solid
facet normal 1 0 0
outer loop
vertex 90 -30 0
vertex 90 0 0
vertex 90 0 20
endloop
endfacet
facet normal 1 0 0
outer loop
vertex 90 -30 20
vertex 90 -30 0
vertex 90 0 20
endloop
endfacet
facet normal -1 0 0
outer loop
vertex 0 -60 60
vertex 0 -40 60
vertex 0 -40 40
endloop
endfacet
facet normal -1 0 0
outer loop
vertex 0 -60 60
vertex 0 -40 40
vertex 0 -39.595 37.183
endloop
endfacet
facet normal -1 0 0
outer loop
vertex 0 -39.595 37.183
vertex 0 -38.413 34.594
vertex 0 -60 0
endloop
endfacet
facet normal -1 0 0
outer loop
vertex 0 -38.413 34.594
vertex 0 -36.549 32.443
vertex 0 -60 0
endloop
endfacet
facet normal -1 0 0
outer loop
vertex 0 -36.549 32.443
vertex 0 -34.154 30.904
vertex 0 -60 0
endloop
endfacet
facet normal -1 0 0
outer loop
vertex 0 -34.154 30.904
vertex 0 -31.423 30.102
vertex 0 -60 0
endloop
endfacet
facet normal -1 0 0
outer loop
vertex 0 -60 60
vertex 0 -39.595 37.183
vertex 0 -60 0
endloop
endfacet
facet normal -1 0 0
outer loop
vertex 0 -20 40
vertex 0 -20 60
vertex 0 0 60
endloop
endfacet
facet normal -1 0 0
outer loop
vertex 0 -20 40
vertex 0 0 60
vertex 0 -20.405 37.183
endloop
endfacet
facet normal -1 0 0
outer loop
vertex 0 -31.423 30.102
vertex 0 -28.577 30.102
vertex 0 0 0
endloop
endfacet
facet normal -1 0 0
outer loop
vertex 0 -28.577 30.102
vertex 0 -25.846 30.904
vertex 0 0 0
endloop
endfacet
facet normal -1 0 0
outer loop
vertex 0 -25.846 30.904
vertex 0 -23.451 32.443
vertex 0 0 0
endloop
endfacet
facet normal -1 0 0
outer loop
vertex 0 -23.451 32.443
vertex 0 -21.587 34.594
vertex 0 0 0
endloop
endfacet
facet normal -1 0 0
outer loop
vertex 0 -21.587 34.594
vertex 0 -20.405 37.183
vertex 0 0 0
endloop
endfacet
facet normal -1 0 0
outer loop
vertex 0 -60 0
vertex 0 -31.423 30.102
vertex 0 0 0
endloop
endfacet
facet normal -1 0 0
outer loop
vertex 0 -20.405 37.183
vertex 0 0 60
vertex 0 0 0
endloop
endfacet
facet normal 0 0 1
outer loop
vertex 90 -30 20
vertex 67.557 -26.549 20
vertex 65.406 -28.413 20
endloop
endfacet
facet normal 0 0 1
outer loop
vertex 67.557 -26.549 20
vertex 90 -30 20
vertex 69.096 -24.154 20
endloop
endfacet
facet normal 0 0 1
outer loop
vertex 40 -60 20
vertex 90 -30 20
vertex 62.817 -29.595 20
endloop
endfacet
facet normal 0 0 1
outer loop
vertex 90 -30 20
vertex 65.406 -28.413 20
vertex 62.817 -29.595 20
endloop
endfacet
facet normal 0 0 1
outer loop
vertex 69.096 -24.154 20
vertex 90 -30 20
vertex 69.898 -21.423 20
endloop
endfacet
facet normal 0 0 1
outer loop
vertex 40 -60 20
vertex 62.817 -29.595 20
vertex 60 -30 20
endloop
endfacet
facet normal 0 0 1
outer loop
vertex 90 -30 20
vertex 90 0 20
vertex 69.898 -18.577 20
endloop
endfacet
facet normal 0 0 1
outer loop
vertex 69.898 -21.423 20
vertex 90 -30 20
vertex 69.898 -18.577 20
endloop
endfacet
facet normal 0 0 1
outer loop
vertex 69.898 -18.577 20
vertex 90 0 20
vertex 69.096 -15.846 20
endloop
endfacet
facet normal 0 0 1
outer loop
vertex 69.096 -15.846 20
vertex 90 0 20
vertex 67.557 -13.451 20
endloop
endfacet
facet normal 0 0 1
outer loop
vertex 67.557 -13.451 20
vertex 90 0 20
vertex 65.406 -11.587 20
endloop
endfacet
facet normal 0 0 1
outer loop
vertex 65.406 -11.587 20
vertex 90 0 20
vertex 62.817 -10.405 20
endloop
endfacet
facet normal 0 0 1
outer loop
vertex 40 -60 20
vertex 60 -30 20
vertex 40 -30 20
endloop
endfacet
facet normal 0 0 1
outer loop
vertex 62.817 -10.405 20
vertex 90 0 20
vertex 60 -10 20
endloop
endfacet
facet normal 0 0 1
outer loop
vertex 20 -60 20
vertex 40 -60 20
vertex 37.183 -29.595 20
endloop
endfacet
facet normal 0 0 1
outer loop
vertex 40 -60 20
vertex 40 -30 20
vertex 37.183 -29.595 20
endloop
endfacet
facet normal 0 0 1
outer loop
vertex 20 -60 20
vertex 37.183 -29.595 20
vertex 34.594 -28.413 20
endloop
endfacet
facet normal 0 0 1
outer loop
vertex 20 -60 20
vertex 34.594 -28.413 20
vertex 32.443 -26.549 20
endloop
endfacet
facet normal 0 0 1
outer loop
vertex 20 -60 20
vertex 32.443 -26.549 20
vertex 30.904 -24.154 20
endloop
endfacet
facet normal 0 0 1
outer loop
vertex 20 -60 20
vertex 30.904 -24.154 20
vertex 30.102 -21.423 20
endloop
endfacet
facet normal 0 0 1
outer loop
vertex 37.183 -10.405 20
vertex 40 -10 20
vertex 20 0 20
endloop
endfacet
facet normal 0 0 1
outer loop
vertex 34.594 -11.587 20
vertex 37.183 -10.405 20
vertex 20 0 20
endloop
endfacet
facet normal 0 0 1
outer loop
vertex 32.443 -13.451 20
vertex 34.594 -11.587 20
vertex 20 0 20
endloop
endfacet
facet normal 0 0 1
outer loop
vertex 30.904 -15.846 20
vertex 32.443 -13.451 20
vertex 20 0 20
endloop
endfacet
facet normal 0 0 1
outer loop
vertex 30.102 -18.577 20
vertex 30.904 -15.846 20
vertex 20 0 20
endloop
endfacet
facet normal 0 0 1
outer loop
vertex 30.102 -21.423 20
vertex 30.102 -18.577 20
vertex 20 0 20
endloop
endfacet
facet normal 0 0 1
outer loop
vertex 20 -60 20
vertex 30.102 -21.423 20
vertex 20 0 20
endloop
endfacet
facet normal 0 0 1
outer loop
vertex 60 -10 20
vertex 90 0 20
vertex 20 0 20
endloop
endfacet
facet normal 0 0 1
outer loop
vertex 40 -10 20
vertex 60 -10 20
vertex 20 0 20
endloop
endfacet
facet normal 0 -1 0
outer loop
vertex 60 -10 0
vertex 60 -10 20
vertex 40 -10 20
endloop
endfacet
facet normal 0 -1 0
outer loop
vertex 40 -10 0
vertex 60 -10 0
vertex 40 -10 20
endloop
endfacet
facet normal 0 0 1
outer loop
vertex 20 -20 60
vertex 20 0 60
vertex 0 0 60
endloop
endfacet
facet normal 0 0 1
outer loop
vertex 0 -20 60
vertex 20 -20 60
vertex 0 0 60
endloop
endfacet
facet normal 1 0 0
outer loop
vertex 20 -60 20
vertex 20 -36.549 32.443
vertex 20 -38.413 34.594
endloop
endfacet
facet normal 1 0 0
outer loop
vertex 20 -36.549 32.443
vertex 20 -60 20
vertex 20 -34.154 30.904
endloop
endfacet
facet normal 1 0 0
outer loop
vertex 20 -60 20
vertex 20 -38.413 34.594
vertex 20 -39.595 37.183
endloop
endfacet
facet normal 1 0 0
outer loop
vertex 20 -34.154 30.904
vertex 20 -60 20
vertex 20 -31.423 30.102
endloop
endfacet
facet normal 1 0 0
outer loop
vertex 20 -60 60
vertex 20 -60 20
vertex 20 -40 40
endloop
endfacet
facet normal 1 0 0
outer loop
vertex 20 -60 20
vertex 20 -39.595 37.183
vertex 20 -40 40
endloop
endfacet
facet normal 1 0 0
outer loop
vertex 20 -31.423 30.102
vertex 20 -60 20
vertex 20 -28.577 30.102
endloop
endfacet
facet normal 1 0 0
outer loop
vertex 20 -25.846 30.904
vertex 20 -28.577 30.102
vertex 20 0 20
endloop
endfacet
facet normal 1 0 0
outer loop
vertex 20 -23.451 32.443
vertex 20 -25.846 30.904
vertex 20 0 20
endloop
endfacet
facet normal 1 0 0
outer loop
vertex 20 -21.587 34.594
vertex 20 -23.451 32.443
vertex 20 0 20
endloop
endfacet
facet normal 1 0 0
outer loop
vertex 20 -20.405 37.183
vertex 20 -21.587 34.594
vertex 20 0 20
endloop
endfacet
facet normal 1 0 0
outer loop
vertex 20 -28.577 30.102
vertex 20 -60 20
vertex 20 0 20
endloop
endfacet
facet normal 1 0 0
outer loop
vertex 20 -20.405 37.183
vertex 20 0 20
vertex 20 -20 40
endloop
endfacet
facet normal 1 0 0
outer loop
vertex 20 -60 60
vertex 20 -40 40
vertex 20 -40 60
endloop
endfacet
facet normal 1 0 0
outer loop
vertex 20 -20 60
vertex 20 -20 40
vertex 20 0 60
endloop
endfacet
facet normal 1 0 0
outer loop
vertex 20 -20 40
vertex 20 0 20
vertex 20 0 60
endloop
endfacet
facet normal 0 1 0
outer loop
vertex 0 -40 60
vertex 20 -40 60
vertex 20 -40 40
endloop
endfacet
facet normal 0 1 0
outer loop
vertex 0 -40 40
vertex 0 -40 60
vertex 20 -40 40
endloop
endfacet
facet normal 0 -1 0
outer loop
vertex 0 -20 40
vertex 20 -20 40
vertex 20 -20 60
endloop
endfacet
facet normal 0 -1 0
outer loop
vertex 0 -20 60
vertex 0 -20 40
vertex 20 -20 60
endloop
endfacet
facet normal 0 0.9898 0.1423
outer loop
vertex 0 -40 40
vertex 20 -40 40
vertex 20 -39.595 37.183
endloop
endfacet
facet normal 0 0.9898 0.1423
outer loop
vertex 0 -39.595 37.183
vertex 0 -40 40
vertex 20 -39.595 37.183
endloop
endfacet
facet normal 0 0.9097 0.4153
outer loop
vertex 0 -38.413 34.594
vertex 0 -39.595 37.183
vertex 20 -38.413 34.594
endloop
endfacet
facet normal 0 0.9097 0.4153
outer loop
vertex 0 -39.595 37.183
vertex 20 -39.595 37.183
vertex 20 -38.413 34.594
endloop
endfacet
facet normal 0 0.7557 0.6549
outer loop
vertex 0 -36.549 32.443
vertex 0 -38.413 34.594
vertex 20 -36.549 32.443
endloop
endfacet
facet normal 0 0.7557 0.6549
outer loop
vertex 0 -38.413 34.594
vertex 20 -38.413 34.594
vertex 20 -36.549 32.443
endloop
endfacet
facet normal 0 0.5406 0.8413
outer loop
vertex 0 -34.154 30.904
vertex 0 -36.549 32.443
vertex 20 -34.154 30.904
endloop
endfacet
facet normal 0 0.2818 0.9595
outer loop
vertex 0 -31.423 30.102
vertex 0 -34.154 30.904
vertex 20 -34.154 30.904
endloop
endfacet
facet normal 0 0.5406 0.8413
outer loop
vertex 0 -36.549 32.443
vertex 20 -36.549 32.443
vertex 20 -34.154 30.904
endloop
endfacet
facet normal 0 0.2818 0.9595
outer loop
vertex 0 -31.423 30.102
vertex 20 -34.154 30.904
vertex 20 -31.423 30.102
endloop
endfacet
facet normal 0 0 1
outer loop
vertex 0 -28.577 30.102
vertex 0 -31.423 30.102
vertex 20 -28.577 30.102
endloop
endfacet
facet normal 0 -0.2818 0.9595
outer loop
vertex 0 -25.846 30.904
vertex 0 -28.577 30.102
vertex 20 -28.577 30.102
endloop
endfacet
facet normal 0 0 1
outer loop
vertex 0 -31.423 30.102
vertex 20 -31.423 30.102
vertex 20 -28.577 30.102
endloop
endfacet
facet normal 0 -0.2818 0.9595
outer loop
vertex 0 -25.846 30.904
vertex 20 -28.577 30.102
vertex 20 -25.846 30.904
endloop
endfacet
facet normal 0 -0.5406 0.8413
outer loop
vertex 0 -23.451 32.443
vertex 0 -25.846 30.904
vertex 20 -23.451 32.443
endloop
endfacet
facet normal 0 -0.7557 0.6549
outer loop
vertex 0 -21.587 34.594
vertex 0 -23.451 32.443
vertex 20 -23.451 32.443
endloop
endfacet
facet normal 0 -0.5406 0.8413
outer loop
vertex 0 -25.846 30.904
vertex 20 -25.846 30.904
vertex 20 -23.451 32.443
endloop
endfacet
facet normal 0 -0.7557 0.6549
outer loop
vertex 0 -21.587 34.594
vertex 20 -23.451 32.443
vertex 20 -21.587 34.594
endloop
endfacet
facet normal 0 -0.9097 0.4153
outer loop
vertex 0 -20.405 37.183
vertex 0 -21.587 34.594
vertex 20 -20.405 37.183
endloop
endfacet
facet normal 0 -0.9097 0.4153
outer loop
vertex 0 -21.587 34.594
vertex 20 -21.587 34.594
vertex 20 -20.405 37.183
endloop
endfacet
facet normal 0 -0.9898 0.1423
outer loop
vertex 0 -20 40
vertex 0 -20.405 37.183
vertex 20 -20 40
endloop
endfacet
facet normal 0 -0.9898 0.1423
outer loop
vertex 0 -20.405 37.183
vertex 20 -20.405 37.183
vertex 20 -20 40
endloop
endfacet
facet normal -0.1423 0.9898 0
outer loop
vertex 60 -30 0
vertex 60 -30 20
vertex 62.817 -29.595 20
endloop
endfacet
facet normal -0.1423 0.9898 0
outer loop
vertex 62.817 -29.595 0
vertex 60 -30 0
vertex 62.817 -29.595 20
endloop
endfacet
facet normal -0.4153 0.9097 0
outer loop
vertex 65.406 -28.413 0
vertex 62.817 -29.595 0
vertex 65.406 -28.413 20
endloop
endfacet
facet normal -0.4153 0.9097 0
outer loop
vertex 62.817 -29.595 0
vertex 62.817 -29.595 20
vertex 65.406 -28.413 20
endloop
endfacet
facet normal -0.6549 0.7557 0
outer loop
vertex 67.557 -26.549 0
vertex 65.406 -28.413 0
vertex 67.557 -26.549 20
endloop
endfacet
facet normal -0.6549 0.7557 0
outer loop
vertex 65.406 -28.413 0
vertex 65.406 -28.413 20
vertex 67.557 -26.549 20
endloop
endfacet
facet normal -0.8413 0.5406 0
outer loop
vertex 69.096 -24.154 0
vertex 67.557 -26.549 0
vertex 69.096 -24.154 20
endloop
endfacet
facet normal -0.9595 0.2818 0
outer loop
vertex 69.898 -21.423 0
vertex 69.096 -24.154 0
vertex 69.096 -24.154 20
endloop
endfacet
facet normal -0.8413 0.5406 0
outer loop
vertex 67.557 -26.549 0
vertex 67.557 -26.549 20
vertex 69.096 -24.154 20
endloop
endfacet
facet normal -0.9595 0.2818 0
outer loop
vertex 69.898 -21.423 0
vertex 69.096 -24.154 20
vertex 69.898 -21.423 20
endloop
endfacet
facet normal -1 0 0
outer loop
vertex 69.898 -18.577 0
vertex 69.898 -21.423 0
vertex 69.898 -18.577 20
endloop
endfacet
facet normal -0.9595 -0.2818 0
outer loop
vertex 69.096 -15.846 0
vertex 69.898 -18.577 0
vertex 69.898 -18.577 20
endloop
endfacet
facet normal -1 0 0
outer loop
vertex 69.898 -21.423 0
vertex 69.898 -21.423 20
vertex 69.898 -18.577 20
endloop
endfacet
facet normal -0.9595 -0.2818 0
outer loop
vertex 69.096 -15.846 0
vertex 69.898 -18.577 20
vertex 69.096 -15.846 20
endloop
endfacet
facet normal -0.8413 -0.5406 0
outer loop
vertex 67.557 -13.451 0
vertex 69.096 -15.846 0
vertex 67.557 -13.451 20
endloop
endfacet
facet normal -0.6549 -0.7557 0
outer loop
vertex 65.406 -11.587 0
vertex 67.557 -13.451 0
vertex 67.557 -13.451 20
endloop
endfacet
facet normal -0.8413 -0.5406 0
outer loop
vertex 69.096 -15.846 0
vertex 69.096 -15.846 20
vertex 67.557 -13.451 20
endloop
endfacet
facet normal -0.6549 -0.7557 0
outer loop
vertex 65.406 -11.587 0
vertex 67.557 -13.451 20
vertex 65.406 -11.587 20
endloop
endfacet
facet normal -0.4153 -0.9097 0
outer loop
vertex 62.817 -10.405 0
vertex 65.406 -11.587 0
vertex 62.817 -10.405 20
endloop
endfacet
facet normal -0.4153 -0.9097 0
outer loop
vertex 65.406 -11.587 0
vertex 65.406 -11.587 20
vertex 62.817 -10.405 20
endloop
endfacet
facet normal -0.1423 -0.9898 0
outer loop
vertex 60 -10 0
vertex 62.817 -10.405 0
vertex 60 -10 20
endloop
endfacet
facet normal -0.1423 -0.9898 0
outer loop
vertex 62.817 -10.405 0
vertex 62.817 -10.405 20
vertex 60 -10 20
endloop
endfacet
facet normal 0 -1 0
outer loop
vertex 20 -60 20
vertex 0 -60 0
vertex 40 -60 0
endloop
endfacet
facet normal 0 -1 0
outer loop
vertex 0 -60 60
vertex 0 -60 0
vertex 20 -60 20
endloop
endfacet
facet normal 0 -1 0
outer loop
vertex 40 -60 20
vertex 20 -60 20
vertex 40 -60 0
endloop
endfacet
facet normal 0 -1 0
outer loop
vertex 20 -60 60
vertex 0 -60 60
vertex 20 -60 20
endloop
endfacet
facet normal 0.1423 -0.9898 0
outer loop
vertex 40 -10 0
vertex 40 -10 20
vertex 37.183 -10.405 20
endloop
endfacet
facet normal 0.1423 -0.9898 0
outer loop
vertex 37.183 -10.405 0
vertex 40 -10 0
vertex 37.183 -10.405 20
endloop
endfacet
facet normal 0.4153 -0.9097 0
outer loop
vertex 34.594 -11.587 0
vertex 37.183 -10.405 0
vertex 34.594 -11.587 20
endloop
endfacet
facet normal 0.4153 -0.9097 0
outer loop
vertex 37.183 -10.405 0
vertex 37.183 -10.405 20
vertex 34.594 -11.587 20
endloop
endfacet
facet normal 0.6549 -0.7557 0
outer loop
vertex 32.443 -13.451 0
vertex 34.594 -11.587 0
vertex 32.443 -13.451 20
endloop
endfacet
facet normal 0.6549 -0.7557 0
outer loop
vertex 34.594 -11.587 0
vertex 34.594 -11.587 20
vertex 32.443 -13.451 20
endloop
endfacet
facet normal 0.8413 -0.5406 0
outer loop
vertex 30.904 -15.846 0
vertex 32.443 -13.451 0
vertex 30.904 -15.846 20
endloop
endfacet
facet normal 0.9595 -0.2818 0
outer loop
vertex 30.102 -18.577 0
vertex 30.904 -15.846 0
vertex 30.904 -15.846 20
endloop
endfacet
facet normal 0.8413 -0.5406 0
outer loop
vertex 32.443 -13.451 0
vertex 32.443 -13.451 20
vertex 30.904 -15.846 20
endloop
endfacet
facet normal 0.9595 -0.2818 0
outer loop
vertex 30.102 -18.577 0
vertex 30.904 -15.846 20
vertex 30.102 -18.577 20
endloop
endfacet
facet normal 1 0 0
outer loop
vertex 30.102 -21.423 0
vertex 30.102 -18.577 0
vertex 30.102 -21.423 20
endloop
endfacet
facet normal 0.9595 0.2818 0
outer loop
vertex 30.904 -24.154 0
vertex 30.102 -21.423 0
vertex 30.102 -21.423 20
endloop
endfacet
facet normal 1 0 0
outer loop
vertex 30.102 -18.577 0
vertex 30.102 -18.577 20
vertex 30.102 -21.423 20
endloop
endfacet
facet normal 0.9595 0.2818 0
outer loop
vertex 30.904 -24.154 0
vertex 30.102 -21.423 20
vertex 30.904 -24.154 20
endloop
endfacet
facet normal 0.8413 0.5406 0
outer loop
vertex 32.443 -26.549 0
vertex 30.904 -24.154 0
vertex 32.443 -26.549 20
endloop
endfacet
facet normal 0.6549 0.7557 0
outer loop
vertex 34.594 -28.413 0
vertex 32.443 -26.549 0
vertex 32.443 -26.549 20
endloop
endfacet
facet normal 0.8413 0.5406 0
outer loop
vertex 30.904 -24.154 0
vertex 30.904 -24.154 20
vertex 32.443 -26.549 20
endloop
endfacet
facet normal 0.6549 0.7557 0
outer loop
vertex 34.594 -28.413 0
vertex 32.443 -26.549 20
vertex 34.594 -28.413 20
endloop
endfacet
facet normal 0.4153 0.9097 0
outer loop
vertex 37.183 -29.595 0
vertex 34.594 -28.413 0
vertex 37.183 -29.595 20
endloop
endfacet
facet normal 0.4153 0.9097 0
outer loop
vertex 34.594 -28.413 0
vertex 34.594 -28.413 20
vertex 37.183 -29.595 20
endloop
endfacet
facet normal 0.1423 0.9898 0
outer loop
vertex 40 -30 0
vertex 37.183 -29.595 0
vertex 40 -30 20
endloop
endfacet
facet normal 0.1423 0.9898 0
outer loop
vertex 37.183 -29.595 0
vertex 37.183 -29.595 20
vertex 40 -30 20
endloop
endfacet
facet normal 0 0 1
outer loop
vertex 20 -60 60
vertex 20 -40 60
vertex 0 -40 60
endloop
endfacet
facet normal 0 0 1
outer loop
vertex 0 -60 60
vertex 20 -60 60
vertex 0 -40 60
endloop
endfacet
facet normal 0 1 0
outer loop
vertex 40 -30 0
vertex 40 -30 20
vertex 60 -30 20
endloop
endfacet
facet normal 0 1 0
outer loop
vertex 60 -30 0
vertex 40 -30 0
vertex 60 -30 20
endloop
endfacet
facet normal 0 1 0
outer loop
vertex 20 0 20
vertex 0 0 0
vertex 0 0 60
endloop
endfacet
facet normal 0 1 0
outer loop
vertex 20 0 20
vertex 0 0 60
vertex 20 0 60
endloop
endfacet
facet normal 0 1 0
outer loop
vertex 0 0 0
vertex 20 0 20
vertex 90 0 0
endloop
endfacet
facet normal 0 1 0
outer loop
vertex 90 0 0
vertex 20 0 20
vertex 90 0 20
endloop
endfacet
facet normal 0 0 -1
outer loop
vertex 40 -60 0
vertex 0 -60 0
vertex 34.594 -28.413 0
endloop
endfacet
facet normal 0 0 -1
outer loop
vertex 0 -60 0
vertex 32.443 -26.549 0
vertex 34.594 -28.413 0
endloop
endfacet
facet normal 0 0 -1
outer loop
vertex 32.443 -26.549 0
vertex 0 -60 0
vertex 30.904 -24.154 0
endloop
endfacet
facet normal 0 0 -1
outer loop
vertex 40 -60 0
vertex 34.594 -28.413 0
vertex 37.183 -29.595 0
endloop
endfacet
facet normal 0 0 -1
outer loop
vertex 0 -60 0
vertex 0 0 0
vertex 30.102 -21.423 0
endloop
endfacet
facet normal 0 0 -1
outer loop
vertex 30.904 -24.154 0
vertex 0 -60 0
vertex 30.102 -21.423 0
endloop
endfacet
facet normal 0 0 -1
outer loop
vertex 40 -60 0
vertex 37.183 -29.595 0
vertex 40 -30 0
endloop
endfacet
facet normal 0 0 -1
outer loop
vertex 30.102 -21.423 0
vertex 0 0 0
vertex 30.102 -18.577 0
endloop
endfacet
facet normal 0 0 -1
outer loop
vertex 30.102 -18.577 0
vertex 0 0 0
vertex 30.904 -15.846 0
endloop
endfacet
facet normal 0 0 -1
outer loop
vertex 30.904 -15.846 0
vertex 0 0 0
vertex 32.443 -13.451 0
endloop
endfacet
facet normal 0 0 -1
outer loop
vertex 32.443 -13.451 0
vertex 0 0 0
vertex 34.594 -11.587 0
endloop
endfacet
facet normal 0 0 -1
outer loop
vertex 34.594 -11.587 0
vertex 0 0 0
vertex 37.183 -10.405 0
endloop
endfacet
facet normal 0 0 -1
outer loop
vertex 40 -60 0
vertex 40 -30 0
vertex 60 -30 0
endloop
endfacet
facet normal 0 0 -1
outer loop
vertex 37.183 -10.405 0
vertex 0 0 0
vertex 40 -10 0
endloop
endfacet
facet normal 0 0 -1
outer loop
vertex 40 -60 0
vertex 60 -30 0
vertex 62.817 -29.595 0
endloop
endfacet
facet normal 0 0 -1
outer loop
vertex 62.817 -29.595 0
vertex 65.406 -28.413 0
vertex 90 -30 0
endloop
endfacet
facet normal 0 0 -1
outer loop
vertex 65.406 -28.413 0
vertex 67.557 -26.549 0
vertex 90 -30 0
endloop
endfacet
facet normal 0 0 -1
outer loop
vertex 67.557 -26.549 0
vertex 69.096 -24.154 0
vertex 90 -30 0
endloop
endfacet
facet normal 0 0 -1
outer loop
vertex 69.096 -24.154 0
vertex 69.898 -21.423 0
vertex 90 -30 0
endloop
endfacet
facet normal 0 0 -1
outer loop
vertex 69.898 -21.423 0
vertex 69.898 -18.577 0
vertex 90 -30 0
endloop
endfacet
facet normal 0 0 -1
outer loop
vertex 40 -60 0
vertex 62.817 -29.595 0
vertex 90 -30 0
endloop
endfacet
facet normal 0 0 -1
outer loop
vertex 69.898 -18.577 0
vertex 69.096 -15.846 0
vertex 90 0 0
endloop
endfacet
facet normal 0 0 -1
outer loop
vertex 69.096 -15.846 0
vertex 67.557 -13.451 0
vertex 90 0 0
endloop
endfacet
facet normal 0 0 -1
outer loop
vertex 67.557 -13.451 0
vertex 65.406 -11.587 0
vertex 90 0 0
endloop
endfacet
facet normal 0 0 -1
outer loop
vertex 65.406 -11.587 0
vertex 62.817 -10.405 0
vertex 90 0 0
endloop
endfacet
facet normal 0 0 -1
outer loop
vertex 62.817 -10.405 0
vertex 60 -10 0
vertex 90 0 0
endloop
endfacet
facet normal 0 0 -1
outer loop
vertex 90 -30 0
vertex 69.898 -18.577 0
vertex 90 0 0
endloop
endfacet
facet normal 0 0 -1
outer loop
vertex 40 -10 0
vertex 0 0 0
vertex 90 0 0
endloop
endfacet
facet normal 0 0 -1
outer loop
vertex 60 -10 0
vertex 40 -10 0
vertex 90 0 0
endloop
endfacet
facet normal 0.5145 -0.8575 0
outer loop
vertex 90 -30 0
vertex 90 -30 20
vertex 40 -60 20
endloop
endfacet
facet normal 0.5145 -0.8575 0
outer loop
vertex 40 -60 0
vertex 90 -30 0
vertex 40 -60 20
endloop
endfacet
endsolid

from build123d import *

# Parameters (mm, degrees)
F1_DEPTH = 60
F3_DEPTH = 20.001
F5_DEPTH = 20.001
F7_DEPTH = 20.001


with BuildPart() as f1:
    # F0 (on Front) → F1 (new body)
    with BuildSketch(Plane.XZ):
        Polygon((0, 60), (0, 0), (90, 0), (90, 20), (20, 20), (20, 60), align=None)
    extrude(amount=F1_DEPTH)

    # F2 (on face) → F3 (cut, through all)
    with BuildSketch(Plane.YZ.offset(20)):
        with BuildLine():
            Line((-20, 60), (-40, 60))
            Line((-40, 60), (-40, 40))
            ThreePointArc((-40, 40), (-30, 30), (-20, 40))
            Line((-20, 40), (-20, 60))
        make_face()
    extrude(amount=-F3_DEPTH, mode=Mode.SUBTRACT)

    # F4 (on face) → F5 (cut, through all)
    with BuildSketch(Plane.XY.offset(20)):
        Polygon((90, -60), (90, -30), (40, -60), align=None)
    extrude(amount=-F5_DEPTH, mode=Mode.SUBTRACT)

    # F6 (on face) → F7 (cut, through all)
    with BuildSketch(Plane.XY.offset(20)):
        with BuildLine():
            ThreePointArc((40, -10), (30, -20), (40, -30))
            Line((40, -30), (60, -30))
            ThreePointArc((60, -30), (70, -20), (60, -10))
            Line((60, -10), (40, -10))
        make_face()
    extrude(amount=-F7_DEPTH, mode=Mode.SUBTRACT)


solid = f1.part
